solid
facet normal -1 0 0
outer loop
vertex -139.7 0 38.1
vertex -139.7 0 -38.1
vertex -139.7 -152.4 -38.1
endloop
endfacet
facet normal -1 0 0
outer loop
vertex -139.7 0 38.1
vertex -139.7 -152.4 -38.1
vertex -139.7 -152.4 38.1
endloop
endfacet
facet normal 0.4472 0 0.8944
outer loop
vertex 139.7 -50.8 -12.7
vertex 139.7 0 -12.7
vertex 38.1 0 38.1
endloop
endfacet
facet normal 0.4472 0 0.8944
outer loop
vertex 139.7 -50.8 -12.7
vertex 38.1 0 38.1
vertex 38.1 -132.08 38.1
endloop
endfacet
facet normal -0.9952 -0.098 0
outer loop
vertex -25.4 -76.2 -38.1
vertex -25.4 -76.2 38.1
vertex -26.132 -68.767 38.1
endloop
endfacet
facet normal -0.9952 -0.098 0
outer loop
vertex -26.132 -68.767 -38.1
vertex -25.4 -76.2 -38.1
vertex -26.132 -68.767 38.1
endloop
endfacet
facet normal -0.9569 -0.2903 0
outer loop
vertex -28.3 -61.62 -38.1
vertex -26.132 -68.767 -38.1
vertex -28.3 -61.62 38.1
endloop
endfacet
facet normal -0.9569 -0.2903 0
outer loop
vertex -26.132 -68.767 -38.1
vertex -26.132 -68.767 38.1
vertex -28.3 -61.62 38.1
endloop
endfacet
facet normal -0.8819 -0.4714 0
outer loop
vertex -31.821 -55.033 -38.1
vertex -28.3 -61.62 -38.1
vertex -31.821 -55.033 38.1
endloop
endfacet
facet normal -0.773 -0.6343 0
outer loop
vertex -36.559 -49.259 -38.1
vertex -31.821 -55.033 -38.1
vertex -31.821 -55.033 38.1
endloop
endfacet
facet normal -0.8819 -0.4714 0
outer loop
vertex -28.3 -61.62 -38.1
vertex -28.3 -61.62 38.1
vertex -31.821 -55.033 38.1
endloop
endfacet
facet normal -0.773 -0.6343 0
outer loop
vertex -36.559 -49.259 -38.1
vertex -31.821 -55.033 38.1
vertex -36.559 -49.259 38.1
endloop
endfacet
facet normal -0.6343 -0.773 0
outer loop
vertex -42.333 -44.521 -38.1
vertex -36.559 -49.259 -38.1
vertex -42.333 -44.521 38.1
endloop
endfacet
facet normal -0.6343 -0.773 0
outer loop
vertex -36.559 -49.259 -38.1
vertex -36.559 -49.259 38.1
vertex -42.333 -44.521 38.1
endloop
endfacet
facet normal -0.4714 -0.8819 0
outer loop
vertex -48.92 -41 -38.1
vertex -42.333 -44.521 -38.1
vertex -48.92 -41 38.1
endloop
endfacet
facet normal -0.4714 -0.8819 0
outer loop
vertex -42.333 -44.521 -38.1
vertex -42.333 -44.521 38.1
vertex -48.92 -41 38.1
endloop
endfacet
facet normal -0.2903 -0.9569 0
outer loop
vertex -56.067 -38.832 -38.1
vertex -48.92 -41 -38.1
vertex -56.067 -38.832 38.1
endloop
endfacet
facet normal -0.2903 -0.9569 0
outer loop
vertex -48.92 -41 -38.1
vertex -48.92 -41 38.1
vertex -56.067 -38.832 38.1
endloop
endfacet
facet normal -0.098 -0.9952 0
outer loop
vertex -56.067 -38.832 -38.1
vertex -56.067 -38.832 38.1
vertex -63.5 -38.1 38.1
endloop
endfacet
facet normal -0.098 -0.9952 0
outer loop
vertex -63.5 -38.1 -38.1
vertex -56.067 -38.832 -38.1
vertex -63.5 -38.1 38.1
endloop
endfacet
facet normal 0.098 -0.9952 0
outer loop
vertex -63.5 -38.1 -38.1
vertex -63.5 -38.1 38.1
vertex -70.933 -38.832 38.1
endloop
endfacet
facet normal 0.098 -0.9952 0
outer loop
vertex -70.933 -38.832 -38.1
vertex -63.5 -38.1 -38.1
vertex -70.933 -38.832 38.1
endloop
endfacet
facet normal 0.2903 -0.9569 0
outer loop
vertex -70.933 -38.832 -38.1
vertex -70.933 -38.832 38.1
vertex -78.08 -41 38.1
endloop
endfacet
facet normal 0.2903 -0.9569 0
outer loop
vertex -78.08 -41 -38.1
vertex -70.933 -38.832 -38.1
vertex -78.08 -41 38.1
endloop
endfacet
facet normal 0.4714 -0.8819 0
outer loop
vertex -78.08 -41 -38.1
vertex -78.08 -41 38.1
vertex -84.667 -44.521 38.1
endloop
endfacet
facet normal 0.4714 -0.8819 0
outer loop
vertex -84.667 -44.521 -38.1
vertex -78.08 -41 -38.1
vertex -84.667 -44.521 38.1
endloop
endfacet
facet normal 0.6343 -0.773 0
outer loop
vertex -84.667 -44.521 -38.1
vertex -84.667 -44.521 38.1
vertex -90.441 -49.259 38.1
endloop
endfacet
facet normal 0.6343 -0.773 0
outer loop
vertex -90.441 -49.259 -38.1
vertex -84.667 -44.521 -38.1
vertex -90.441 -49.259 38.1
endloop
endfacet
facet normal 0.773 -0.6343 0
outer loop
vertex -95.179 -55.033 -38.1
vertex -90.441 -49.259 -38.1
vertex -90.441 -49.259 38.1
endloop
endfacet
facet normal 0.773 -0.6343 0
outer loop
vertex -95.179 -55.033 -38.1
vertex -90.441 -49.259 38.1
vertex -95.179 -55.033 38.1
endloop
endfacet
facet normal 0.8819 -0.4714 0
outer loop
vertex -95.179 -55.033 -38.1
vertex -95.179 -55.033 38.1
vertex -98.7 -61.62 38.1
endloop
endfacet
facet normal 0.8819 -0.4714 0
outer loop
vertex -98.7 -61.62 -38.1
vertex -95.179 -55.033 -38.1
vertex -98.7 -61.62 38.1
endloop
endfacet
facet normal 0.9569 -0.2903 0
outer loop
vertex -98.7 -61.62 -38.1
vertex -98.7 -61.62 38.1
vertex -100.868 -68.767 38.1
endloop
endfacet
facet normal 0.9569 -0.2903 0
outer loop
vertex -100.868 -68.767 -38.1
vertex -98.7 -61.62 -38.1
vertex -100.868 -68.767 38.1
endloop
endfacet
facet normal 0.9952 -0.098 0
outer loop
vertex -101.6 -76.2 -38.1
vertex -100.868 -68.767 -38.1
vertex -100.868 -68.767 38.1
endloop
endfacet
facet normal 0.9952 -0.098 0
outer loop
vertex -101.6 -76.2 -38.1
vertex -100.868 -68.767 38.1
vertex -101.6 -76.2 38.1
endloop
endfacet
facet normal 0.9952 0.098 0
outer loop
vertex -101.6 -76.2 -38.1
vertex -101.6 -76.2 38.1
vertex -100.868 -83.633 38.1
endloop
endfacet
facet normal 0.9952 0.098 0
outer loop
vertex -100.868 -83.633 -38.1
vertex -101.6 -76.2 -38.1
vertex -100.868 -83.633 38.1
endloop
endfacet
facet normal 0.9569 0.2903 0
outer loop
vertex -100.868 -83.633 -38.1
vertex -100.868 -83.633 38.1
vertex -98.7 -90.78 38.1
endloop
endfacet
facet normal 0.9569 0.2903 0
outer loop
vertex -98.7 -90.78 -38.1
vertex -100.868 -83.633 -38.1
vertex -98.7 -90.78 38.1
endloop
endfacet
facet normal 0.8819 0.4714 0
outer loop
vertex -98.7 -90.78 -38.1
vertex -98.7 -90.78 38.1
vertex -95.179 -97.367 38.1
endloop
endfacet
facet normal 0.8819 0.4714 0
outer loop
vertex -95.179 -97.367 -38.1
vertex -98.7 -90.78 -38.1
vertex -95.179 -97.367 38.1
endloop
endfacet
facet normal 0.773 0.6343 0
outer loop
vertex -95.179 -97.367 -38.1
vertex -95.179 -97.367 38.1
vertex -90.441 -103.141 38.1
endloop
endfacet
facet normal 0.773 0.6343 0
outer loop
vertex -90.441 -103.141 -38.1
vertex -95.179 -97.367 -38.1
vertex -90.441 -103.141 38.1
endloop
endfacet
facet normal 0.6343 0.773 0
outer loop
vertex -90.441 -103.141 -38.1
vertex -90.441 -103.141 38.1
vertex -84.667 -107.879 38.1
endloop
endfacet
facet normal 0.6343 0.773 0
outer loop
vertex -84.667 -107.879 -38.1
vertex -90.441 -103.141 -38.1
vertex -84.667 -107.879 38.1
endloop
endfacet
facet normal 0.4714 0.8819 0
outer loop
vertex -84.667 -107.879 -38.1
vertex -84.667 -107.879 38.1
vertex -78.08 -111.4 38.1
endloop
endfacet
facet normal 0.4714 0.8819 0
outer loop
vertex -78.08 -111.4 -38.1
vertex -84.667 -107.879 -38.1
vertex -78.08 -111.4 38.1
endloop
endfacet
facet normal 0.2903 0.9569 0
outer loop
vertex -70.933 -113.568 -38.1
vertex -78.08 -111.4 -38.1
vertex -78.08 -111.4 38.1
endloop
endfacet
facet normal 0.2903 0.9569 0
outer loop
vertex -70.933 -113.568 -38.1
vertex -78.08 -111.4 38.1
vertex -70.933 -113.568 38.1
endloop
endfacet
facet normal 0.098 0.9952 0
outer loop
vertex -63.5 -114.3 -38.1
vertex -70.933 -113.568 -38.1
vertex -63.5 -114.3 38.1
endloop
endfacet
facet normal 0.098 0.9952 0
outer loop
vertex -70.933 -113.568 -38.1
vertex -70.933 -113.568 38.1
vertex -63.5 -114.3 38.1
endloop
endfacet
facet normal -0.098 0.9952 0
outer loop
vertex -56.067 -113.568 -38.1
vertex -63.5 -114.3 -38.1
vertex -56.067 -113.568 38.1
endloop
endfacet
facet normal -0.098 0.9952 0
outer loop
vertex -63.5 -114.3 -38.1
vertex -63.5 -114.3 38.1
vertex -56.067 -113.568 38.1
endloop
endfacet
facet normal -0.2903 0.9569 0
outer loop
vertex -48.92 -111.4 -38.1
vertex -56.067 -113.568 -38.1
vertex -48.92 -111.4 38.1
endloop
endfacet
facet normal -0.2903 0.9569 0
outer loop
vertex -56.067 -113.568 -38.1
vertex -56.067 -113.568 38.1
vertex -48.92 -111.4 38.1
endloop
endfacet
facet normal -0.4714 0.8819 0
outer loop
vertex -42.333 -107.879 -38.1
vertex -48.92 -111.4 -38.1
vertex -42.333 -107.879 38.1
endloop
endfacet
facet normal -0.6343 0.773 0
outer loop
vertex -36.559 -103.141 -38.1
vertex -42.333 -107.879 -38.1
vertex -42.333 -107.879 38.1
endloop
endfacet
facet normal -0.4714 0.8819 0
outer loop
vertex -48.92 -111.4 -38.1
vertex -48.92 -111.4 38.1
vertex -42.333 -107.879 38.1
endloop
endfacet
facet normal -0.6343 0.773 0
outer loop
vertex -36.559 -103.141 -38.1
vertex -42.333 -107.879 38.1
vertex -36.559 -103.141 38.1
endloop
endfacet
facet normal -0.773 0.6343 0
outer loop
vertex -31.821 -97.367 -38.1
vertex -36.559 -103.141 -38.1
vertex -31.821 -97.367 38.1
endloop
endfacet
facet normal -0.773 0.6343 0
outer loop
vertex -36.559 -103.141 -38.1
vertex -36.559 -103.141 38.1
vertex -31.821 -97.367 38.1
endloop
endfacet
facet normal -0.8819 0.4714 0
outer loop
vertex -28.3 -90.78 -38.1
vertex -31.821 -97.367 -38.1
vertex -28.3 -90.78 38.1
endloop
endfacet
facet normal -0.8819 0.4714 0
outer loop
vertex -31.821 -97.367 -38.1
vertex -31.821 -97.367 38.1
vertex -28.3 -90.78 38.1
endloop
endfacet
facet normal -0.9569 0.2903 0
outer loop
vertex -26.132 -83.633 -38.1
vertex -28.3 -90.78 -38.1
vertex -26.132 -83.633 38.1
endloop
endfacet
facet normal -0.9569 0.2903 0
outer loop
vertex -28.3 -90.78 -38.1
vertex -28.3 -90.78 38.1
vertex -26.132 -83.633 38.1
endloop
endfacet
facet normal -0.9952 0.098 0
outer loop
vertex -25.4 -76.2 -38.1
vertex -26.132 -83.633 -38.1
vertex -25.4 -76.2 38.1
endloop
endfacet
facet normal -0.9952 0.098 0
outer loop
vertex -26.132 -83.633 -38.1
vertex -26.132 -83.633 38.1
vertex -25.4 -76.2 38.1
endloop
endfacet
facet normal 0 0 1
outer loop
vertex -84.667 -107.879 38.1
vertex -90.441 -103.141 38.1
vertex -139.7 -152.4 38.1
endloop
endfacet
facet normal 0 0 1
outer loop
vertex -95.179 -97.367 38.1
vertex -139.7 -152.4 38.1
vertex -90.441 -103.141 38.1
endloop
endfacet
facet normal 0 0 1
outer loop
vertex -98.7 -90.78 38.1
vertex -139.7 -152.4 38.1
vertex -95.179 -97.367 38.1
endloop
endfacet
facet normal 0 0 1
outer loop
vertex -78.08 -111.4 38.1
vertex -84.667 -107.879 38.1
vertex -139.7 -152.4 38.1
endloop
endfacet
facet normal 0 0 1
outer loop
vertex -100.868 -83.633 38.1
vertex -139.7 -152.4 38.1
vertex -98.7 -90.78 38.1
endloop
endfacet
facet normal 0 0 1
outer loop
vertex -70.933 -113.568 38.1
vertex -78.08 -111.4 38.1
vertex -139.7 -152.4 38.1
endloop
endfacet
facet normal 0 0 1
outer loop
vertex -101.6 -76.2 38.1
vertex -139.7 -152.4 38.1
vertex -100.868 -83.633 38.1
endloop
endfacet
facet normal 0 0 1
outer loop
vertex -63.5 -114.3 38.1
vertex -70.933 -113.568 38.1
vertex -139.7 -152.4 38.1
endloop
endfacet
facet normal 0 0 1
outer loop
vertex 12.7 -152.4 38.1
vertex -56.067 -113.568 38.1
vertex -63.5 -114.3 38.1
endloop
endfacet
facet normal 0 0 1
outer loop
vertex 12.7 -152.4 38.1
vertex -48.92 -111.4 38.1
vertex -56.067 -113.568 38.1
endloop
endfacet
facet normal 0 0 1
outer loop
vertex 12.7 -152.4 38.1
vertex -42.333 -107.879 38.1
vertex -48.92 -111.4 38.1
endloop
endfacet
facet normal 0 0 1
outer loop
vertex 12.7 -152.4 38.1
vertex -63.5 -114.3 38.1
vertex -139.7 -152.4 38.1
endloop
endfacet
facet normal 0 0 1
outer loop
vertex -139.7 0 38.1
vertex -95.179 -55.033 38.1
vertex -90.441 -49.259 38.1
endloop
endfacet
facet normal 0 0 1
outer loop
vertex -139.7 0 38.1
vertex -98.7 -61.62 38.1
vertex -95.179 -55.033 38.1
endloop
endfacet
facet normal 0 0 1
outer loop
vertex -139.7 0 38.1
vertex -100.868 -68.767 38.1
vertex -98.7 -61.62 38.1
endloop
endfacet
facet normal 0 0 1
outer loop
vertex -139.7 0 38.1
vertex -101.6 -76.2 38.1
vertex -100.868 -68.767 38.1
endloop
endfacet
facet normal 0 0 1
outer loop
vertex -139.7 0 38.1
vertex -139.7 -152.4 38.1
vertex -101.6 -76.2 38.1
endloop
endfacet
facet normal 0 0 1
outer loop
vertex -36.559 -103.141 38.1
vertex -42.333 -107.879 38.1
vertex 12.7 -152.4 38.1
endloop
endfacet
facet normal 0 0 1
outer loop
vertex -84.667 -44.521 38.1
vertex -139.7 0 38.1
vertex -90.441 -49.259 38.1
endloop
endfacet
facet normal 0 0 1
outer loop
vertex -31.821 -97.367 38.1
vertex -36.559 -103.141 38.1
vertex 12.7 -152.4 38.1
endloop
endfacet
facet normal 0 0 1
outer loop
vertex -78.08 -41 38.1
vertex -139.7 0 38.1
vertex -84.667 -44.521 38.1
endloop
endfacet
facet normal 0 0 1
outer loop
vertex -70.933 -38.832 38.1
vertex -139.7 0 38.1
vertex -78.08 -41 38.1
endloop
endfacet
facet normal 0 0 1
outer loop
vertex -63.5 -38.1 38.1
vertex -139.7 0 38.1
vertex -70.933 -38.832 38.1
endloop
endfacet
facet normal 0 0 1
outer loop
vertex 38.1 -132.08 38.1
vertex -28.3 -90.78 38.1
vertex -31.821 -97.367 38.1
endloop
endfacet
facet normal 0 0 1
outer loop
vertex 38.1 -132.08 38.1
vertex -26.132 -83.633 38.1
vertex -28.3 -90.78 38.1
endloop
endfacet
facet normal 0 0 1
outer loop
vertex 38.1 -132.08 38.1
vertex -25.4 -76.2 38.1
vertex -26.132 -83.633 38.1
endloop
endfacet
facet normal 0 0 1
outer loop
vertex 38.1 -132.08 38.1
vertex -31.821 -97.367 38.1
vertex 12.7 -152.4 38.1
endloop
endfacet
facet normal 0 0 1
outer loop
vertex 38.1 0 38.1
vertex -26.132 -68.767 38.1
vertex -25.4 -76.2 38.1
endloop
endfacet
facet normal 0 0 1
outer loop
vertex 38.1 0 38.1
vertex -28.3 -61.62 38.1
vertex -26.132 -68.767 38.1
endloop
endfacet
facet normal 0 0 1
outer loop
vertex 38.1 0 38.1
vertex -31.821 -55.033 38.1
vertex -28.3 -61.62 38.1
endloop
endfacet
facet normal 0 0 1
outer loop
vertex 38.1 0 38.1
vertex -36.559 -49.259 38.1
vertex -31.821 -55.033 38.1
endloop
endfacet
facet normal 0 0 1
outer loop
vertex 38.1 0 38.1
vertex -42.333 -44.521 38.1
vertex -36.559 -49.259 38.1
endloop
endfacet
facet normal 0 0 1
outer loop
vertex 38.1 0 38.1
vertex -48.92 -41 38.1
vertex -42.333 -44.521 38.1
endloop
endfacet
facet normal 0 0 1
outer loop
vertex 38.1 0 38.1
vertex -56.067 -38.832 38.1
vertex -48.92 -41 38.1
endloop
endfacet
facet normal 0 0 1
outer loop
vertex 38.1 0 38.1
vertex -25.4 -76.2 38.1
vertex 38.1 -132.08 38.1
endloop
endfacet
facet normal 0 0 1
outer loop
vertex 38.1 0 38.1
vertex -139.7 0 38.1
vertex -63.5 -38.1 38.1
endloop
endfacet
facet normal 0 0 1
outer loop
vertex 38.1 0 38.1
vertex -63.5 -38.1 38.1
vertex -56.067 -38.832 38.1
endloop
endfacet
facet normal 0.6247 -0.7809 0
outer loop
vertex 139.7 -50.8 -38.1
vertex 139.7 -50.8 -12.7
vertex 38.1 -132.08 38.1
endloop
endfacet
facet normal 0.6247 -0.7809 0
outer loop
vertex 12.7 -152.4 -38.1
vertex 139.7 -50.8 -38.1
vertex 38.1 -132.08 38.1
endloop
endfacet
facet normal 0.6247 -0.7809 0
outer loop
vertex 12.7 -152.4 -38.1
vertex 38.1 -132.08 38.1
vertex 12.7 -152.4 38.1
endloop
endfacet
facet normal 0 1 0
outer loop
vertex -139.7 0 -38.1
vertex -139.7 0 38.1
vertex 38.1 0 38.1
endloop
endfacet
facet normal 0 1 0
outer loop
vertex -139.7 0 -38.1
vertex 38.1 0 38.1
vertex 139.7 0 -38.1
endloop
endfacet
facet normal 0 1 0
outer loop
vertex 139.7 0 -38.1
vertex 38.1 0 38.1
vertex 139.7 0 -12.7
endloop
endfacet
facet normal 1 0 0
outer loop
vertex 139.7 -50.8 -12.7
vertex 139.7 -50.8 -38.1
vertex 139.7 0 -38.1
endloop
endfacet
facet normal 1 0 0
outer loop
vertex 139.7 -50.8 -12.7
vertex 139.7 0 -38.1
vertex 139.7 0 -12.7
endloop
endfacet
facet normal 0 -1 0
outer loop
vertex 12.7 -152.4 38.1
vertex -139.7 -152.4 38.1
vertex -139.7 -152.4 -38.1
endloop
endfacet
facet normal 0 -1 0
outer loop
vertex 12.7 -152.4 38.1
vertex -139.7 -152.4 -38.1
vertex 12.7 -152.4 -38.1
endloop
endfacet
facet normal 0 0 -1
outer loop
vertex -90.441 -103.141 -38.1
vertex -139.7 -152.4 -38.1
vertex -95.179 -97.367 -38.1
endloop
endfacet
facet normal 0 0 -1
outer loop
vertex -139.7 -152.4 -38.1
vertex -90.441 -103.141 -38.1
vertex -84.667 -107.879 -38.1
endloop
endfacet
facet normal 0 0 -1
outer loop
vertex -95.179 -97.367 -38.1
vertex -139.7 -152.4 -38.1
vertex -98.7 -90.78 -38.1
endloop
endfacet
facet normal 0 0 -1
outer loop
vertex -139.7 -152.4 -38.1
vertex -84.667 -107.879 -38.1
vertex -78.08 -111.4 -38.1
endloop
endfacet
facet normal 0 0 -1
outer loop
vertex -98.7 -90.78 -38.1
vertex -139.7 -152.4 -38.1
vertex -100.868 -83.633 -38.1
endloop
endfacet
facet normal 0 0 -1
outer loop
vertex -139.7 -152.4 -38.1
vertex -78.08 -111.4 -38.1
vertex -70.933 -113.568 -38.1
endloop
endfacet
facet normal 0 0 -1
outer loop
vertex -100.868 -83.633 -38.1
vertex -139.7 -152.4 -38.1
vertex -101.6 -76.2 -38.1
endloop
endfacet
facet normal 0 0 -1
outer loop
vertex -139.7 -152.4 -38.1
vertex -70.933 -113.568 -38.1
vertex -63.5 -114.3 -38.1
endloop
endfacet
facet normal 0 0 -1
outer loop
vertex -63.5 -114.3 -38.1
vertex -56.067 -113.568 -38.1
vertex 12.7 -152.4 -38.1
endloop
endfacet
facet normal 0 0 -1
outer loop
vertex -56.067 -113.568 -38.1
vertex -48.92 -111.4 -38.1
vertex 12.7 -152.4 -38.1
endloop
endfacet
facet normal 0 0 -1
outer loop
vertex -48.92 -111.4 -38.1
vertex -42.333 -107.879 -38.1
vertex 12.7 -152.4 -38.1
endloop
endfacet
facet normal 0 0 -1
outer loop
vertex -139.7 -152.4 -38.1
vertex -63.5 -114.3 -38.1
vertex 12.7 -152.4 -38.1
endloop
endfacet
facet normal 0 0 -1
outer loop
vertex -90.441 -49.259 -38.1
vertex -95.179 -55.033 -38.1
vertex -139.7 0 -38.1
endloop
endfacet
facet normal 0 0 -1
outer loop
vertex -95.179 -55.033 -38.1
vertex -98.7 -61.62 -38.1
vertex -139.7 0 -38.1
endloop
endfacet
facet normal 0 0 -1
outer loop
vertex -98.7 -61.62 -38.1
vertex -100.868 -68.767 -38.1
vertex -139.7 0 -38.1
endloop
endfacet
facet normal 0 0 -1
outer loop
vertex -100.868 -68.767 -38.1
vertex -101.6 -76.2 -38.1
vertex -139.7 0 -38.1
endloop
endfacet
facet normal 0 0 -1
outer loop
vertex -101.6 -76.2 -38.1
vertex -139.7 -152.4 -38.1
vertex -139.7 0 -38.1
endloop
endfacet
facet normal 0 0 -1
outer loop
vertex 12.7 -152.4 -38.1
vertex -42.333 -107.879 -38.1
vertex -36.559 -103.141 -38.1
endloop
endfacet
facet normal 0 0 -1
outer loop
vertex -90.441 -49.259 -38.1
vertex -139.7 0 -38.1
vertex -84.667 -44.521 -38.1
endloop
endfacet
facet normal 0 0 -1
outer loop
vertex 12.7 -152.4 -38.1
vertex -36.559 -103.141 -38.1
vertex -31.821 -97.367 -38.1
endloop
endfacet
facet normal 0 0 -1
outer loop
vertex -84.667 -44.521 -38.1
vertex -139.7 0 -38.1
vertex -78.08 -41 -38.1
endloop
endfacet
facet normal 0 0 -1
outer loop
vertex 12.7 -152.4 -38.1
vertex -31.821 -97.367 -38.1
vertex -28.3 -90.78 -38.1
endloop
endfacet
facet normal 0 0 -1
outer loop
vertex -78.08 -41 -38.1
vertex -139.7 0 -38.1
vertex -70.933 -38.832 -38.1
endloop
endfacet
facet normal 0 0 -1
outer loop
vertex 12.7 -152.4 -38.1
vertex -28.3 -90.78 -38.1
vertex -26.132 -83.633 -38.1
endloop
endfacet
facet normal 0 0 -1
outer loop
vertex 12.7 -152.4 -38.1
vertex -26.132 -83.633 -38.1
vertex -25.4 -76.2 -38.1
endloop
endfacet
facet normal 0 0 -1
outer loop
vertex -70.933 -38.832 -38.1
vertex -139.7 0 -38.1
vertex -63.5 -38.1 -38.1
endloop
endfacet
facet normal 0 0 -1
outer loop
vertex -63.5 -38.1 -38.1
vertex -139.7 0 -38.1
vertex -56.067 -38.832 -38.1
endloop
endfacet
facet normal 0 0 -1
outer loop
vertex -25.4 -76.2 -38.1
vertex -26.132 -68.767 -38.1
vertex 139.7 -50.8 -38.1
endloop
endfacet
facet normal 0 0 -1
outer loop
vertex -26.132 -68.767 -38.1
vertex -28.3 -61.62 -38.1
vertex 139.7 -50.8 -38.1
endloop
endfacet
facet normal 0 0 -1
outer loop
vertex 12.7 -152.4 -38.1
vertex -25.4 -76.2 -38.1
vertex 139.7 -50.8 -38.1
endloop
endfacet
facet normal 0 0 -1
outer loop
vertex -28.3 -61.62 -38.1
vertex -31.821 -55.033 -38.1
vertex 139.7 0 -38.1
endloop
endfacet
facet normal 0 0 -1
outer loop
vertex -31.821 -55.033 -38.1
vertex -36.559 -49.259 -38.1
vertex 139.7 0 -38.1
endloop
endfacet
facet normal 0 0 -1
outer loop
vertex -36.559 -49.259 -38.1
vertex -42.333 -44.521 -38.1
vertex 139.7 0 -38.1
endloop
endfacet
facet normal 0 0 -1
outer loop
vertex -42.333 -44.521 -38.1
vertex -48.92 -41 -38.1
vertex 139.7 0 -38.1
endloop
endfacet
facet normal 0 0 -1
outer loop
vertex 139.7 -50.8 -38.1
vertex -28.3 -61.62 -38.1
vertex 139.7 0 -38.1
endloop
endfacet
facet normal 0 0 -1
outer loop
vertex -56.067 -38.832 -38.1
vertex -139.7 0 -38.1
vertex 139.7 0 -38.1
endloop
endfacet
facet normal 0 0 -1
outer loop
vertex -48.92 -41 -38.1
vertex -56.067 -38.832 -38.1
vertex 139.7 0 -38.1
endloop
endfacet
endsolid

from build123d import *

# Parameters (mm, degrees)
F0_W     = 279.4
F0_H     = 76.2
F1_DEPTH = 152.4
F3_DEPTH = 125.1016873866
F4_SIZE2 = 50.8
F4_SIZE  = 101.6
F5_R     = 38.1
F6_DEPTH = 200.5284074694


with BuildPart() as f1:
    # F0 (on Front) → F1 (new body)
    with BuildSketch(Plane.XZ):
        Rectangle(F0_W, F0_H)
    extrude(amount=F1_DEPTH)

    # F2 (on face) → F3 (cut)
    with BuildSketch(Plane.XY.offset(38.1)):
        Polygon((139.7, -152.4), (139.7, -50.8), (12.7, -152.4), align=None)
    extrude(amount=-F3_DEPTH, mode=Mode.SUBTRACT)

    # F4
    f4_edges = [f1.edges().sort_by_distance(p)[0] for p in [
        (139.7, -25.4, 38.1),
    ]]
    f4_side = f1.faces().sort_by_distance((-17.386905, -68.640476, 38.1))[0]
    chamfer(f4_edges, length=F4_SIZE, length2=F4_SIZE2, reference=f4_side)

    # F5 (on face) → F6 (cut)
    with BuildSketch(Plane.XY.offset(38.1)):
        with Locations((-63.5, -76.2)):
            Circle(F5_R)
    extrude(amount=-F6_DEPTH, mode=Mode.SUBTRACT)


solid = f1.part
